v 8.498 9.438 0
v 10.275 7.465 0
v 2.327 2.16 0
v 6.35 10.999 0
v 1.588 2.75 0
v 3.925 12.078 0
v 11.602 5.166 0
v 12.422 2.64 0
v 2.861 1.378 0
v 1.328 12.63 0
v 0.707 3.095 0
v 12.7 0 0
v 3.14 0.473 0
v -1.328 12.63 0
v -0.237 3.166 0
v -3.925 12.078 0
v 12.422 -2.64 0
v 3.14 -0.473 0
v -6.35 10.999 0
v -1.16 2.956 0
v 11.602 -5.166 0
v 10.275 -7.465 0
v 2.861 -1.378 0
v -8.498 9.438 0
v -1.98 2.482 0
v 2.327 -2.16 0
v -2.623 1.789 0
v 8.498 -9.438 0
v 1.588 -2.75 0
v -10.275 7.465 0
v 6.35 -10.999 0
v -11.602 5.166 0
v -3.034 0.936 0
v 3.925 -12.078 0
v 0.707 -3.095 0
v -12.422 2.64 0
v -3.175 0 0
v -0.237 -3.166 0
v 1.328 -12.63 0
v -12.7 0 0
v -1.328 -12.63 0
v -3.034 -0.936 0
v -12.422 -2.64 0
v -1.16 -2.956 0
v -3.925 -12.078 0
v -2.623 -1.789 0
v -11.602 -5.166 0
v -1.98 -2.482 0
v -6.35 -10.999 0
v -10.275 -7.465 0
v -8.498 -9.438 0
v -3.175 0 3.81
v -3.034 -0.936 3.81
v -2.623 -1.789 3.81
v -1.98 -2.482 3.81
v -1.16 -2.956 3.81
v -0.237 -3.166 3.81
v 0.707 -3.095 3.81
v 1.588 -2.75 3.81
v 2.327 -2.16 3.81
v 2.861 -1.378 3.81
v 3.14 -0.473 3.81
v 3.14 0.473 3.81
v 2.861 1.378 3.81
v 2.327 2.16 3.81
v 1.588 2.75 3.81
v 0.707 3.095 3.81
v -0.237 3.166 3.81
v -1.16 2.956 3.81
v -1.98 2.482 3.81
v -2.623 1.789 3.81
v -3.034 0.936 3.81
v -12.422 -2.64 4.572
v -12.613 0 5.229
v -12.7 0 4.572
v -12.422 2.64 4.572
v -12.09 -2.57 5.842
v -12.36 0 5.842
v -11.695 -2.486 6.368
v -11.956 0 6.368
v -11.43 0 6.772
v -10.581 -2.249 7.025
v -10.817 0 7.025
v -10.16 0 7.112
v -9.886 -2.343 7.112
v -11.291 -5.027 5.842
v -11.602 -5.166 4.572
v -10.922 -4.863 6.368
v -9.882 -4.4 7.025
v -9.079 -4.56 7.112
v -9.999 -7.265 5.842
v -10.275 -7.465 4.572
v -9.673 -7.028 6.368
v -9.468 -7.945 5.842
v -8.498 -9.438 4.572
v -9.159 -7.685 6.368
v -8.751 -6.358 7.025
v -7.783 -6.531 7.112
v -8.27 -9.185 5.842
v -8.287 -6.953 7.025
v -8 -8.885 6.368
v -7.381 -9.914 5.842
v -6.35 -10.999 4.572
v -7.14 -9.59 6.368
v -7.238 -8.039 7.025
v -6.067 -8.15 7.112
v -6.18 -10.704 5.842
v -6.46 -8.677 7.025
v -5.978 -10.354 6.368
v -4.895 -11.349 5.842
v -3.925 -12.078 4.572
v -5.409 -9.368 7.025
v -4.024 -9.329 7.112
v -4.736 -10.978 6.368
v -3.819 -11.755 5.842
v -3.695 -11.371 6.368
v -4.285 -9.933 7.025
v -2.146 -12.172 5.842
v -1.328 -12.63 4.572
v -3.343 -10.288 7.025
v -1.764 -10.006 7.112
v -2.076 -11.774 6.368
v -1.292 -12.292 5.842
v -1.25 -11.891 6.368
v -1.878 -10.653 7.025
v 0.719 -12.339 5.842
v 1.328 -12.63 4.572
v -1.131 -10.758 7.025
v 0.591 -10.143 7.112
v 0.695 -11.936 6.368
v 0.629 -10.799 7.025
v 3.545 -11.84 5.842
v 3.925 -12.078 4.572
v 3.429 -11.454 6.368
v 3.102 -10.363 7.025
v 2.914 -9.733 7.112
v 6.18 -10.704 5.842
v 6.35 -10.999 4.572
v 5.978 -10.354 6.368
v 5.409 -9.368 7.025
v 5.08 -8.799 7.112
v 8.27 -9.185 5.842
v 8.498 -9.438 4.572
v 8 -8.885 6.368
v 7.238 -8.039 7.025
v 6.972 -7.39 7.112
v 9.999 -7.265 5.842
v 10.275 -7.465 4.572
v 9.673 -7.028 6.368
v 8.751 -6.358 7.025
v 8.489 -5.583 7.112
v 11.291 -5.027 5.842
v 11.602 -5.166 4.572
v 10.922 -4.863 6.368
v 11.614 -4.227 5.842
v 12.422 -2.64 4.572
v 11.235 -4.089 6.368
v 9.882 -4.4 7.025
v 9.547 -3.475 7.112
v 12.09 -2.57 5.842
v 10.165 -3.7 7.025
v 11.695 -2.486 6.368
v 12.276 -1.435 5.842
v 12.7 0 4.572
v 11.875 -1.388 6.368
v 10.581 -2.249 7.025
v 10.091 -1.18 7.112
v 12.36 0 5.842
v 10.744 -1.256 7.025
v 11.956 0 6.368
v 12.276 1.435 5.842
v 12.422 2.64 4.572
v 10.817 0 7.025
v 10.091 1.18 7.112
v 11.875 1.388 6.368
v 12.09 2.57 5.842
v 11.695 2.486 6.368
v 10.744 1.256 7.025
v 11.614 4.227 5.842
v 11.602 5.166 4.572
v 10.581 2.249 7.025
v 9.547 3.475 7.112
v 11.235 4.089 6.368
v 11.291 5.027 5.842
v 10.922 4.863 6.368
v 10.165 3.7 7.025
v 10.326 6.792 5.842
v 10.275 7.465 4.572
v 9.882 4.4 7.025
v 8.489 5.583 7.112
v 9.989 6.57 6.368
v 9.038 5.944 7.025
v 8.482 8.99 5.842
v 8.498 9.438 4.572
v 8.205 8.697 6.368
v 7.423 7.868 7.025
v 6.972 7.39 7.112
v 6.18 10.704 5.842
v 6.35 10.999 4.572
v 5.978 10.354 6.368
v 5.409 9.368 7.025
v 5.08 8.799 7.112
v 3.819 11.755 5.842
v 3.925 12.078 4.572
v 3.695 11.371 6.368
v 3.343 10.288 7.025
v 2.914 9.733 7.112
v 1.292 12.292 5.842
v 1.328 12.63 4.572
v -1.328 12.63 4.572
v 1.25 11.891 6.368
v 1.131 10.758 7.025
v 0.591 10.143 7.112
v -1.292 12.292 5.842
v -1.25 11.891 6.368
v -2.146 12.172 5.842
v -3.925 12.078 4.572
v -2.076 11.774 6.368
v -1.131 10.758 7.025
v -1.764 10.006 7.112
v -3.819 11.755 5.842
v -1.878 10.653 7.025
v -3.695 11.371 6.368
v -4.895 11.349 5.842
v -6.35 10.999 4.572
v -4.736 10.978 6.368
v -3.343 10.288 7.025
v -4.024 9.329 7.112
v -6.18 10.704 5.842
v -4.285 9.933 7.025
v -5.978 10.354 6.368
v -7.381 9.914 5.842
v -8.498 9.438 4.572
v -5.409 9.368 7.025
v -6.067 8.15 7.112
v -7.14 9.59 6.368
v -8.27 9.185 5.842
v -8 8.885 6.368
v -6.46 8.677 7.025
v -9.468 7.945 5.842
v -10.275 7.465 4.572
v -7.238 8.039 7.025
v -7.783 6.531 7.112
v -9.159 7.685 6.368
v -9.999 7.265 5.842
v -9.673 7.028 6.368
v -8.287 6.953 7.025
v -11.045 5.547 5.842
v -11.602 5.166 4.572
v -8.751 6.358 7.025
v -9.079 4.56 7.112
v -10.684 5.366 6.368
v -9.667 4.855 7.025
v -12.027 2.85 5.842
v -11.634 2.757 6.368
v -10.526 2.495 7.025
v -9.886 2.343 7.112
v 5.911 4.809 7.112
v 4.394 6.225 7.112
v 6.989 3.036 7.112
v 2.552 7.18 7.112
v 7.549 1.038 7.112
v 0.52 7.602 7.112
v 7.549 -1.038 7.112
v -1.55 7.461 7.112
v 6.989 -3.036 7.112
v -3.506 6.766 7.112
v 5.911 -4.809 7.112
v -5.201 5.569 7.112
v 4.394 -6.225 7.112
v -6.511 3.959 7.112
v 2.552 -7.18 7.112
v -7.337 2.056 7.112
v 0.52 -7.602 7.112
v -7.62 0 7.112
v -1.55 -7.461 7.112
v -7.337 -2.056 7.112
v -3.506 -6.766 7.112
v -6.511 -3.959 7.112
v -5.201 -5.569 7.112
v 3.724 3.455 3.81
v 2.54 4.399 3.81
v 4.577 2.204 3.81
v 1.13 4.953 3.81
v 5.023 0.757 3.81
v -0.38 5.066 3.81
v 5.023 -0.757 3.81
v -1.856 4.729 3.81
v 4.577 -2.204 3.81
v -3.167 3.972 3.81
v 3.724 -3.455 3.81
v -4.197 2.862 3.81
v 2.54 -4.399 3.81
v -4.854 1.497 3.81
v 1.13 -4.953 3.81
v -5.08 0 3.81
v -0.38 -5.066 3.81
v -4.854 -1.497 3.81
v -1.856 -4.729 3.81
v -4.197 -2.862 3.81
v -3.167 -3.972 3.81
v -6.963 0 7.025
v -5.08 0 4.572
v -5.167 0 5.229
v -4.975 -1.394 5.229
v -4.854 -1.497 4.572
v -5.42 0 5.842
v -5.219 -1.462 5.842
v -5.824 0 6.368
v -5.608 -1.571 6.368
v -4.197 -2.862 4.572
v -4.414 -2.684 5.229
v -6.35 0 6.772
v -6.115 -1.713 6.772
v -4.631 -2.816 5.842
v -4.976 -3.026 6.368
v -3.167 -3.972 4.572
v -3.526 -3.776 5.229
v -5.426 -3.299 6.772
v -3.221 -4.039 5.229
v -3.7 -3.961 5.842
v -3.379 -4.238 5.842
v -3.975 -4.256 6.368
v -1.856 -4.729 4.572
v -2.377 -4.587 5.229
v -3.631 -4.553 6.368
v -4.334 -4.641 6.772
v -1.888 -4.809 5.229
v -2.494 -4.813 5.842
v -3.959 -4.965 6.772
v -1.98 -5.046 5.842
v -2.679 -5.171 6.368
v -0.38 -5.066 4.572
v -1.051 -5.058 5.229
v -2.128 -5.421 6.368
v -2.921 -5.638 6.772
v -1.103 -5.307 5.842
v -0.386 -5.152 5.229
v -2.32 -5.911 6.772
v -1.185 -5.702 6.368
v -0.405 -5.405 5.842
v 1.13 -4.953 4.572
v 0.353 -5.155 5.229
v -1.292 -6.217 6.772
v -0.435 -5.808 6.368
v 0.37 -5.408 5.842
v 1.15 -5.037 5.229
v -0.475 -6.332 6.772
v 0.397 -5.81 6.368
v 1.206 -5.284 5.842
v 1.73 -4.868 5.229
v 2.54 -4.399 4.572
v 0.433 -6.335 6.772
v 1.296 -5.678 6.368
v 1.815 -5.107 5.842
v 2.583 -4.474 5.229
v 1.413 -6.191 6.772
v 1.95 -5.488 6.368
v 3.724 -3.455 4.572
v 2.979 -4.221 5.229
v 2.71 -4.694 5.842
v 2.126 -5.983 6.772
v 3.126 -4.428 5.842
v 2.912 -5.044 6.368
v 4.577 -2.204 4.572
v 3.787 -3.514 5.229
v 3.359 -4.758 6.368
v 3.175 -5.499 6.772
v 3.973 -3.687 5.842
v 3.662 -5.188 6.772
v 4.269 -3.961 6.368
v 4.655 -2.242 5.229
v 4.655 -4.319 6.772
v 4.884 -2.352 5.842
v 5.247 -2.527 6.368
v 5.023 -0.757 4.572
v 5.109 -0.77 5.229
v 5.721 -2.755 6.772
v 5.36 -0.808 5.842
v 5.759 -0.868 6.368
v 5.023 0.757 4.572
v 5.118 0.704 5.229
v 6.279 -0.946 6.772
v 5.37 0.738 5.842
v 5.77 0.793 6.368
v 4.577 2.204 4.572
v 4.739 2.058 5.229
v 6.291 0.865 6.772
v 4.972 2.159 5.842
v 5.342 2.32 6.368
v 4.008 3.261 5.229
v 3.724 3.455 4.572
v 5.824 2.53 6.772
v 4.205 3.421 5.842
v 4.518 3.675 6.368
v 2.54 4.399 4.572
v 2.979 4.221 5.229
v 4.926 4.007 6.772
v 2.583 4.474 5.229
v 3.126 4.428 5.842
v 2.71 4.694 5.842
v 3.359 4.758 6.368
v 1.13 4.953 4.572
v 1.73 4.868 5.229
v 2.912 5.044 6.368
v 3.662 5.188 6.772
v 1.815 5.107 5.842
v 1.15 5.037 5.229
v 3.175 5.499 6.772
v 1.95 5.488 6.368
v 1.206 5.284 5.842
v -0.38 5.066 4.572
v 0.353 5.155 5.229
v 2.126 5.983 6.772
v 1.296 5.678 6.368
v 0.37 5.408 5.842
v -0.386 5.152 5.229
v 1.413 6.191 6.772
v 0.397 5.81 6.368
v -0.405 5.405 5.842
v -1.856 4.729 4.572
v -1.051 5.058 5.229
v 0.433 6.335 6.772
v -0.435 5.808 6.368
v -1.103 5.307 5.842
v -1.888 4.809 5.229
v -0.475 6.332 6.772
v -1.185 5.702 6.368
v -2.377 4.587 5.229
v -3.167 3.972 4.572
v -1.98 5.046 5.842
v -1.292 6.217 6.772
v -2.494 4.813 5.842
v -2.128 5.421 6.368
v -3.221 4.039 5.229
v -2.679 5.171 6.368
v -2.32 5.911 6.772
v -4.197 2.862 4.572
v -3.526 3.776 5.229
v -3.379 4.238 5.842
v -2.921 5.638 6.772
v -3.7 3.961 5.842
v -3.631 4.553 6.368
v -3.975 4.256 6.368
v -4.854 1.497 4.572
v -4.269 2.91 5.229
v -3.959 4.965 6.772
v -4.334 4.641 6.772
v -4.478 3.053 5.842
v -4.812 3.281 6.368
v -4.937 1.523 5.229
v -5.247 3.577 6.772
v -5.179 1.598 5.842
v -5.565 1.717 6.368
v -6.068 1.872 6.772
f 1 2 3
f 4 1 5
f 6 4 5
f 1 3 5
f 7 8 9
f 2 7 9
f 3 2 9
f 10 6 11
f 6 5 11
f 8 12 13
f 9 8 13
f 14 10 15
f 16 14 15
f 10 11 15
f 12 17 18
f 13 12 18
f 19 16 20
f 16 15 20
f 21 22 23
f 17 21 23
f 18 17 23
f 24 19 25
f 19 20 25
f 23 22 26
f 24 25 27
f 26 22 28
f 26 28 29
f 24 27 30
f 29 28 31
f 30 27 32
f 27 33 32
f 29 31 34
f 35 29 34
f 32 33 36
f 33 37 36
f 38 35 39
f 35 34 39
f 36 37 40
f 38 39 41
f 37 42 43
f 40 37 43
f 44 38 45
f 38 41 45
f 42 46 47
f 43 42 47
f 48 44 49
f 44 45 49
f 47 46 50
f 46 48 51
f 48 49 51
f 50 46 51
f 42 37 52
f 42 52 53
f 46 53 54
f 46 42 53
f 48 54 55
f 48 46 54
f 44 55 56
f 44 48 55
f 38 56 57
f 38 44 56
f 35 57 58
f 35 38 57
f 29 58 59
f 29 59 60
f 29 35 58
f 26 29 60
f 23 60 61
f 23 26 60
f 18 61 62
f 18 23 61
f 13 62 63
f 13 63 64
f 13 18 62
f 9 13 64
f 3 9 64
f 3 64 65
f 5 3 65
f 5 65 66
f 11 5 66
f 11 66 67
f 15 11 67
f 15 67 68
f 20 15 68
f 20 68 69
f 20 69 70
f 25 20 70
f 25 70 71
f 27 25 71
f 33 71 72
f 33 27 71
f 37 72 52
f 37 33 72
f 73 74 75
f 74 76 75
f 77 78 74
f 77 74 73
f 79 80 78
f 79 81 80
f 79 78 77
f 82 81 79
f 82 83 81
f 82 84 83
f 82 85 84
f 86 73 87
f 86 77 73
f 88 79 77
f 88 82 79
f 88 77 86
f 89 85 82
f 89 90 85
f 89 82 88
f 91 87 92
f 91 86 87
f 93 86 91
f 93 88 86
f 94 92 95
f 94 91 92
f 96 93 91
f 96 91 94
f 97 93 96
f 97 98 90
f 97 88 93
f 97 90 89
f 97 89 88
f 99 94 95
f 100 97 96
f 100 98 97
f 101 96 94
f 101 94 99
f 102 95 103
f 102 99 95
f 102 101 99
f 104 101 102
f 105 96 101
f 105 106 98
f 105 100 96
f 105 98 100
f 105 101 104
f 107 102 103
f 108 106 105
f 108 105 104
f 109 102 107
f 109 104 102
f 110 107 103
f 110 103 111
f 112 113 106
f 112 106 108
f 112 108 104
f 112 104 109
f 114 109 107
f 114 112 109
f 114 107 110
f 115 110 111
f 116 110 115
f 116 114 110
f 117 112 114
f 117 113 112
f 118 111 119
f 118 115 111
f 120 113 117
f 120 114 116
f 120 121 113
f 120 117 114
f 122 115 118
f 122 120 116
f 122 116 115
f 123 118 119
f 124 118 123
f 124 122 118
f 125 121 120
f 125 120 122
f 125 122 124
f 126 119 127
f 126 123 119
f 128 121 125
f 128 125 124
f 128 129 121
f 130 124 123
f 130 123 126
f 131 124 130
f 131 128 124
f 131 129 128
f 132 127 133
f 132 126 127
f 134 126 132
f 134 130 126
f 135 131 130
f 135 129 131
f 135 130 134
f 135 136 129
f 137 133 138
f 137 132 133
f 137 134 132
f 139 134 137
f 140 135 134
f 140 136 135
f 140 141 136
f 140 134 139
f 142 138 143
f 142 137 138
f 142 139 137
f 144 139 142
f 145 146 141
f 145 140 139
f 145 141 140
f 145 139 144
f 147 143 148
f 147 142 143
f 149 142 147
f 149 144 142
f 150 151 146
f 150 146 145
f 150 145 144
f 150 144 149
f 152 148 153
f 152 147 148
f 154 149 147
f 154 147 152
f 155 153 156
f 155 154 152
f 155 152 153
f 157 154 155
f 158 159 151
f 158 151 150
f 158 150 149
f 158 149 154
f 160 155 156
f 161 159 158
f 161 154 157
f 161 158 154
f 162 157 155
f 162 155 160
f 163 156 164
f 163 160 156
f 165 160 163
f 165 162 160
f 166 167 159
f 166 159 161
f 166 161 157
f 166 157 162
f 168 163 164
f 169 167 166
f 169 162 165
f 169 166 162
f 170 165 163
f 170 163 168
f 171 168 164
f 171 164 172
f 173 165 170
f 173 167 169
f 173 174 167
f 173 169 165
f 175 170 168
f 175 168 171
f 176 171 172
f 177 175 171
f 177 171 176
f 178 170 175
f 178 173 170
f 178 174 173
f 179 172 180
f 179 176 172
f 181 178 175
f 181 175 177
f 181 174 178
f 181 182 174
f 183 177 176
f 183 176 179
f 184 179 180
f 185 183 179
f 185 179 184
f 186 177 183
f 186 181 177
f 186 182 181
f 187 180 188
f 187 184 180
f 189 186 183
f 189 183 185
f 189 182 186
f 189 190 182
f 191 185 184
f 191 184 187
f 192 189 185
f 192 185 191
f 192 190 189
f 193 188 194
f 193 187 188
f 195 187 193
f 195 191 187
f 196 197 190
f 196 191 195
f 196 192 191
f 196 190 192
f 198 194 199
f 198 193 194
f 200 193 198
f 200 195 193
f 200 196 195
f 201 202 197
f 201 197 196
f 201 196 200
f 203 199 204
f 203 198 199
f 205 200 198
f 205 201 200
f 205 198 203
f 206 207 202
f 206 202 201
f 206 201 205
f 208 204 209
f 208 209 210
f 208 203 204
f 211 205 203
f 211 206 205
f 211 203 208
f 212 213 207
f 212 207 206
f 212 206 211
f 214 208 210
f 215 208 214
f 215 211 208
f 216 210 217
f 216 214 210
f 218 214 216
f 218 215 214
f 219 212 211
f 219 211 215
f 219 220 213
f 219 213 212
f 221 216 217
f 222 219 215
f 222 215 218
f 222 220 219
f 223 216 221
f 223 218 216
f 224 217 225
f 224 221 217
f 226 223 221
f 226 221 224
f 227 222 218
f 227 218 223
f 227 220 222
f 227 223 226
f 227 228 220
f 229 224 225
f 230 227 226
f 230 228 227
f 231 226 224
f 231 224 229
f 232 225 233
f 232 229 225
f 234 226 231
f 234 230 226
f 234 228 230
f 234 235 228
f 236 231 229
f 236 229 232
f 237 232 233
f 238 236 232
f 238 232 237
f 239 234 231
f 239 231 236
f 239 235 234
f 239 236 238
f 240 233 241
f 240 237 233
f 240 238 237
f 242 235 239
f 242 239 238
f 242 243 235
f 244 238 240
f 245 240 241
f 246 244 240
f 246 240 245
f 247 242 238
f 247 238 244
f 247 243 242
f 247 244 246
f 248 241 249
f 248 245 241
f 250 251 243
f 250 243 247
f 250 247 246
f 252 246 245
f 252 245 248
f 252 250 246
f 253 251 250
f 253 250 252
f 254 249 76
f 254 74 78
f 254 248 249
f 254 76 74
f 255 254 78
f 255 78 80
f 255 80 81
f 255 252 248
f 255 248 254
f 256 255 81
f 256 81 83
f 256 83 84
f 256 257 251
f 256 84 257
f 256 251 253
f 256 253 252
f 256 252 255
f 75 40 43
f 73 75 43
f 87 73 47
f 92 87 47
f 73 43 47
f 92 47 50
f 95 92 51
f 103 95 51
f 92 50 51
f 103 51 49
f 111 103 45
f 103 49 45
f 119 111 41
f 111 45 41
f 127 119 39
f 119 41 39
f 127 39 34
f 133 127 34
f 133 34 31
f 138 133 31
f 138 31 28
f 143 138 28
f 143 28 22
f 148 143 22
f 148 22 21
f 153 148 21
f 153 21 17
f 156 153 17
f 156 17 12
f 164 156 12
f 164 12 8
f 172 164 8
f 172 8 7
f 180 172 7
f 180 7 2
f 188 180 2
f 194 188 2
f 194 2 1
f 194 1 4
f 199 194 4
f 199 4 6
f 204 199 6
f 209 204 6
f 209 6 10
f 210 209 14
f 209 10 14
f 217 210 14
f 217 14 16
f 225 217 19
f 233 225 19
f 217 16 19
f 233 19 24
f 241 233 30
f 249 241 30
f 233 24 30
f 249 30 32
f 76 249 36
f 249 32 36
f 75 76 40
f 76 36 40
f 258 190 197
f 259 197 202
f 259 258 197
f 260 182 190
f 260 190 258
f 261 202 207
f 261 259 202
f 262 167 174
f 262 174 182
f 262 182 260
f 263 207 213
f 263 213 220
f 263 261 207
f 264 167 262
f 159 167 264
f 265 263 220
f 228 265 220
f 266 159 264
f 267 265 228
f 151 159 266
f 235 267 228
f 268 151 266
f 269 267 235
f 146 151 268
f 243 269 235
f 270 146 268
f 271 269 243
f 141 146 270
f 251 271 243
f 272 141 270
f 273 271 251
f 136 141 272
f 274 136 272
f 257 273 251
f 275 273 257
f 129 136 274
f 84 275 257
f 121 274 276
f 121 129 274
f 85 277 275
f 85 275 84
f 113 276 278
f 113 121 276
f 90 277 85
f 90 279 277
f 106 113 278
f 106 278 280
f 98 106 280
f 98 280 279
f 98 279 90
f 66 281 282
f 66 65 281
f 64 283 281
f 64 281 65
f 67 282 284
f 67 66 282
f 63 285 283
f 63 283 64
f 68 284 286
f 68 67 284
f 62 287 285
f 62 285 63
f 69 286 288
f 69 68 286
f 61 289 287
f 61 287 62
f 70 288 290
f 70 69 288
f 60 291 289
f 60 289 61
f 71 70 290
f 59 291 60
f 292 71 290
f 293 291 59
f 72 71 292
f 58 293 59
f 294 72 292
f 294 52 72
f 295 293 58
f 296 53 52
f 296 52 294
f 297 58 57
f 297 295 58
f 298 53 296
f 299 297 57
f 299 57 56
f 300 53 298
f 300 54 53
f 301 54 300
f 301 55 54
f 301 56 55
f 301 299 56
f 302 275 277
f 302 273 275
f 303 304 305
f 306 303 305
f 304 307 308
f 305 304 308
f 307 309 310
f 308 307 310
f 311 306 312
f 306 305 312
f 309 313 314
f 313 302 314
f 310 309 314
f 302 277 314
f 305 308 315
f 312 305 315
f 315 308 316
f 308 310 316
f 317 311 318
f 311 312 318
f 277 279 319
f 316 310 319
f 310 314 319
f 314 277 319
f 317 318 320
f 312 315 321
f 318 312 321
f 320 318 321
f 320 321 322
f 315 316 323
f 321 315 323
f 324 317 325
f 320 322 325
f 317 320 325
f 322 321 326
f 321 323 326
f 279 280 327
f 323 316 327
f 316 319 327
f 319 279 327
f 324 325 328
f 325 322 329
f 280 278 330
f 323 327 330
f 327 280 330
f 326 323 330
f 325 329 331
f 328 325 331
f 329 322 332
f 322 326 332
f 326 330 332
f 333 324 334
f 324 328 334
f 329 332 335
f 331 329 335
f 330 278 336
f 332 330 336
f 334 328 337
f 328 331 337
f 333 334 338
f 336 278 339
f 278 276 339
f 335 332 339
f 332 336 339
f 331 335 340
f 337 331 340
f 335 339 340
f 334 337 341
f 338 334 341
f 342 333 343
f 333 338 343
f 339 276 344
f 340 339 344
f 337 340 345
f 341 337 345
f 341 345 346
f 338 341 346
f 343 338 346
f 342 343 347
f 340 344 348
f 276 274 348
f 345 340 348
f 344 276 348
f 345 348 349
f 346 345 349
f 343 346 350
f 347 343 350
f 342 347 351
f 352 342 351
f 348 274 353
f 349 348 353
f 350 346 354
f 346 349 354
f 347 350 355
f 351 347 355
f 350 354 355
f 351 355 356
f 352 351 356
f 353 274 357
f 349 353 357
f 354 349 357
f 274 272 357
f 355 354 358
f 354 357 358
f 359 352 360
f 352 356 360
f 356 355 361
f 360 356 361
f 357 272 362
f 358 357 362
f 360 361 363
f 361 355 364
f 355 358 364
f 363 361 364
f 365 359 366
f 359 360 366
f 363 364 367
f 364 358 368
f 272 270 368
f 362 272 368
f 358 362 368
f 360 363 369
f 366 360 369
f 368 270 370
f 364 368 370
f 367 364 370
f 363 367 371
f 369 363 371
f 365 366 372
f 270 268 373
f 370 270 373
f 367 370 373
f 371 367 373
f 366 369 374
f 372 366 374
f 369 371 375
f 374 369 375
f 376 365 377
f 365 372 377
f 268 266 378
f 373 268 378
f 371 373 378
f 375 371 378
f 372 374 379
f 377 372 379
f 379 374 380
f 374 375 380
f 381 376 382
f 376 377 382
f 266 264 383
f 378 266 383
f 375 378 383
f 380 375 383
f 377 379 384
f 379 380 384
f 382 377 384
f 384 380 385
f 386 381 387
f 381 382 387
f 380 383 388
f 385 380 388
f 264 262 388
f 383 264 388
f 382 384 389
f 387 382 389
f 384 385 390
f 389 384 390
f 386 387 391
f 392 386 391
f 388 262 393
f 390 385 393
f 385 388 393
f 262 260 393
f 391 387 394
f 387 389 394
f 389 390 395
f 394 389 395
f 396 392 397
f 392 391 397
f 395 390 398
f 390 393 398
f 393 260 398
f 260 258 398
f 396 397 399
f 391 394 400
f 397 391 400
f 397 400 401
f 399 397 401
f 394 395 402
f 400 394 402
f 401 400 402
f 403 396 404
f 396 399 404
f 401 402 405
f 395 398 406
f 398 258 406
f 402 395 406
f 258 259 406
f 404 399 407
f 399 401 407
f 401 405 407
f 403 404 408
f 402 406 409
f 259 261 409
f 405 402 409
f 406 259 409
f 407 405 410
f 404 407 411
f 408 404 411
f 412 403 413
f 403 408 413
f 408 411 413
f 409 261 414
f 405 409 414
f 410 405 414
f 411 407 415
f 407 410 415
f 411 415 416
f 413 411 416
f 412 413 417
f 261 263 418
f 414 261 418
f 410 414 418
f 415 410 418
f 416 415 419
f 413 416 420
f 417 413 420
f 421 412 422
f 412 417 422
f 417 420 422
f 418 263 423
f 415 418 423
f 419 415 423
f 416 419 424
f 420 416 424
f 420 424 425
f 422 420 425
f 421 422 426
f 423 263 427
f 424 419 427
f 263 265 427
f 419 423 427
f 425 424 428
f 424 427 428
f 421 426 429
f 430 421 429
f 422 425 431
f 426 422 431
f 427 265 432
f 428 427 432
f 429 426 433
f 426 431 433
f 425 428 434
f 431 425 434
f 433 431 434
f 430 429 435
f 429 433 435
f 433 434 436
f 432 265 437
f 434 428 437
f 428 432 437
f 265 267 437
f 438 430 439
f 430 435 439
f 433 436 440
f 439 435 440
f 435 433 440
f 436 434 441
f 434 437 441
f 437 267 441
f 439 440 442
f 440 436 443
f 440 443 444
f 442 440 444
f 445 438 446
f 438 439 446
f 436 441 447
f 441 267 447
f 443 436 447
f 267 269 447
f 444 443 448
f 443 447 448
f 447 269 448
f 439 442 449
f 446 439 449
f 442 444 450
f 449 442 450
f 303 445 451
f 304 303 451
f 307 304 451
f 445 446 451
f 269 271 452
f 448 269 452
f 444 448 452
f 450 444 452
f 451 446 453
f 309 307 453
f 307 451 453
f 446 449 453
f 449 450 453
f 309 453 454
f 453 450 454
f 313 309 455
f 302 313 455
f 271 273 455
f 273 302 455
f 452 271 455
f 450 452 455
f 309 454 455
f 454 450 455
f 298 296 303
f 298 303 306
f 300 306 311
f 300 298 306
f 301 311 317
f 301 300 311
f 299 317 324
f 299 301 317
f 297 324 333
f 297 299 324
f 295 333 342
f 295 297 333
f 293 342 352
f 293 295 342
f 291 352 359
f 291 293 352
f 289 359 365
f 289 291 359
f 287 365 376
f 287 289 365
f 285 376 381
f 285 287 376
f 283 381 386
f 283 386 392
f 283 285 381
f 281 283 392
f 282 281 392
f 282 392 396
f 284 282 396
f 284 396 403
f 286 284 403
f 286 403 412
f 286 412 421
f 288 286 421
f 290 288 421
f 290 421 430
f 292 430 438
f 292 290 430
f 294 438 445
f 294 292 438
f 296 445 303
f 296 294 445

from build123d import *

# Parameters (mm, degrees)
SKETCH1_R           = 12.7
SKETCH1_R_2         = 3.175
BOSS_EXTRUDE1_DEPTH = 3.81
SKETCH2_R           = 12.7
SKETCH2_R_2         = 5.08
BOSS_EXTRUDE2_DEPTH = 3.302
FILLET2_R           = 2.54


with BuildPart() as part:
    # Sketch1 → Boss-Extrude1 (new body)
    with BuildSketch(Plane(origin=(0, 0, 0), x_dir=(0, 1, 0), z_dir=(0, 0, 1))):
        with Locations(Location((0, 0, 0), (0, 0, 90))):
            Circle(SKETCH1_R)
        with Locations(Location((0, 0, 0), (0, 0, 90))):
            Circle(SKETCH1_R_2, mode=Mode.SUBTRACT)
    extrude(amount=BOSS_EXTRUDE1_DEPTH)

    # Sketch2 → Boss-Extrude2 (add)
    with BuildSketch(Plane.XY.offset(3.81)):
        with Locations(Location((0, 0, 0), (0, 0, 180))):
            Circle(SKETCH2_R)
        with Locations(Location((0, 0, 0), (0, 0, 180))):
            Circle(SKETCH2_R_2, mode=Mode.SUBTRACT)
    extrude(amount=BOSS_EXTRUDE2_DEPTH)

    # Fillet2
    fillet2_edges = [part.edges().sort_by_distance(p)[0] for p in [
        (12.7, 0, 7.112),
        (5.08, 0, 7.112),
    ]]
    fillet(fillet2_edges, radius=FILLET2_R)


solid = part.part
